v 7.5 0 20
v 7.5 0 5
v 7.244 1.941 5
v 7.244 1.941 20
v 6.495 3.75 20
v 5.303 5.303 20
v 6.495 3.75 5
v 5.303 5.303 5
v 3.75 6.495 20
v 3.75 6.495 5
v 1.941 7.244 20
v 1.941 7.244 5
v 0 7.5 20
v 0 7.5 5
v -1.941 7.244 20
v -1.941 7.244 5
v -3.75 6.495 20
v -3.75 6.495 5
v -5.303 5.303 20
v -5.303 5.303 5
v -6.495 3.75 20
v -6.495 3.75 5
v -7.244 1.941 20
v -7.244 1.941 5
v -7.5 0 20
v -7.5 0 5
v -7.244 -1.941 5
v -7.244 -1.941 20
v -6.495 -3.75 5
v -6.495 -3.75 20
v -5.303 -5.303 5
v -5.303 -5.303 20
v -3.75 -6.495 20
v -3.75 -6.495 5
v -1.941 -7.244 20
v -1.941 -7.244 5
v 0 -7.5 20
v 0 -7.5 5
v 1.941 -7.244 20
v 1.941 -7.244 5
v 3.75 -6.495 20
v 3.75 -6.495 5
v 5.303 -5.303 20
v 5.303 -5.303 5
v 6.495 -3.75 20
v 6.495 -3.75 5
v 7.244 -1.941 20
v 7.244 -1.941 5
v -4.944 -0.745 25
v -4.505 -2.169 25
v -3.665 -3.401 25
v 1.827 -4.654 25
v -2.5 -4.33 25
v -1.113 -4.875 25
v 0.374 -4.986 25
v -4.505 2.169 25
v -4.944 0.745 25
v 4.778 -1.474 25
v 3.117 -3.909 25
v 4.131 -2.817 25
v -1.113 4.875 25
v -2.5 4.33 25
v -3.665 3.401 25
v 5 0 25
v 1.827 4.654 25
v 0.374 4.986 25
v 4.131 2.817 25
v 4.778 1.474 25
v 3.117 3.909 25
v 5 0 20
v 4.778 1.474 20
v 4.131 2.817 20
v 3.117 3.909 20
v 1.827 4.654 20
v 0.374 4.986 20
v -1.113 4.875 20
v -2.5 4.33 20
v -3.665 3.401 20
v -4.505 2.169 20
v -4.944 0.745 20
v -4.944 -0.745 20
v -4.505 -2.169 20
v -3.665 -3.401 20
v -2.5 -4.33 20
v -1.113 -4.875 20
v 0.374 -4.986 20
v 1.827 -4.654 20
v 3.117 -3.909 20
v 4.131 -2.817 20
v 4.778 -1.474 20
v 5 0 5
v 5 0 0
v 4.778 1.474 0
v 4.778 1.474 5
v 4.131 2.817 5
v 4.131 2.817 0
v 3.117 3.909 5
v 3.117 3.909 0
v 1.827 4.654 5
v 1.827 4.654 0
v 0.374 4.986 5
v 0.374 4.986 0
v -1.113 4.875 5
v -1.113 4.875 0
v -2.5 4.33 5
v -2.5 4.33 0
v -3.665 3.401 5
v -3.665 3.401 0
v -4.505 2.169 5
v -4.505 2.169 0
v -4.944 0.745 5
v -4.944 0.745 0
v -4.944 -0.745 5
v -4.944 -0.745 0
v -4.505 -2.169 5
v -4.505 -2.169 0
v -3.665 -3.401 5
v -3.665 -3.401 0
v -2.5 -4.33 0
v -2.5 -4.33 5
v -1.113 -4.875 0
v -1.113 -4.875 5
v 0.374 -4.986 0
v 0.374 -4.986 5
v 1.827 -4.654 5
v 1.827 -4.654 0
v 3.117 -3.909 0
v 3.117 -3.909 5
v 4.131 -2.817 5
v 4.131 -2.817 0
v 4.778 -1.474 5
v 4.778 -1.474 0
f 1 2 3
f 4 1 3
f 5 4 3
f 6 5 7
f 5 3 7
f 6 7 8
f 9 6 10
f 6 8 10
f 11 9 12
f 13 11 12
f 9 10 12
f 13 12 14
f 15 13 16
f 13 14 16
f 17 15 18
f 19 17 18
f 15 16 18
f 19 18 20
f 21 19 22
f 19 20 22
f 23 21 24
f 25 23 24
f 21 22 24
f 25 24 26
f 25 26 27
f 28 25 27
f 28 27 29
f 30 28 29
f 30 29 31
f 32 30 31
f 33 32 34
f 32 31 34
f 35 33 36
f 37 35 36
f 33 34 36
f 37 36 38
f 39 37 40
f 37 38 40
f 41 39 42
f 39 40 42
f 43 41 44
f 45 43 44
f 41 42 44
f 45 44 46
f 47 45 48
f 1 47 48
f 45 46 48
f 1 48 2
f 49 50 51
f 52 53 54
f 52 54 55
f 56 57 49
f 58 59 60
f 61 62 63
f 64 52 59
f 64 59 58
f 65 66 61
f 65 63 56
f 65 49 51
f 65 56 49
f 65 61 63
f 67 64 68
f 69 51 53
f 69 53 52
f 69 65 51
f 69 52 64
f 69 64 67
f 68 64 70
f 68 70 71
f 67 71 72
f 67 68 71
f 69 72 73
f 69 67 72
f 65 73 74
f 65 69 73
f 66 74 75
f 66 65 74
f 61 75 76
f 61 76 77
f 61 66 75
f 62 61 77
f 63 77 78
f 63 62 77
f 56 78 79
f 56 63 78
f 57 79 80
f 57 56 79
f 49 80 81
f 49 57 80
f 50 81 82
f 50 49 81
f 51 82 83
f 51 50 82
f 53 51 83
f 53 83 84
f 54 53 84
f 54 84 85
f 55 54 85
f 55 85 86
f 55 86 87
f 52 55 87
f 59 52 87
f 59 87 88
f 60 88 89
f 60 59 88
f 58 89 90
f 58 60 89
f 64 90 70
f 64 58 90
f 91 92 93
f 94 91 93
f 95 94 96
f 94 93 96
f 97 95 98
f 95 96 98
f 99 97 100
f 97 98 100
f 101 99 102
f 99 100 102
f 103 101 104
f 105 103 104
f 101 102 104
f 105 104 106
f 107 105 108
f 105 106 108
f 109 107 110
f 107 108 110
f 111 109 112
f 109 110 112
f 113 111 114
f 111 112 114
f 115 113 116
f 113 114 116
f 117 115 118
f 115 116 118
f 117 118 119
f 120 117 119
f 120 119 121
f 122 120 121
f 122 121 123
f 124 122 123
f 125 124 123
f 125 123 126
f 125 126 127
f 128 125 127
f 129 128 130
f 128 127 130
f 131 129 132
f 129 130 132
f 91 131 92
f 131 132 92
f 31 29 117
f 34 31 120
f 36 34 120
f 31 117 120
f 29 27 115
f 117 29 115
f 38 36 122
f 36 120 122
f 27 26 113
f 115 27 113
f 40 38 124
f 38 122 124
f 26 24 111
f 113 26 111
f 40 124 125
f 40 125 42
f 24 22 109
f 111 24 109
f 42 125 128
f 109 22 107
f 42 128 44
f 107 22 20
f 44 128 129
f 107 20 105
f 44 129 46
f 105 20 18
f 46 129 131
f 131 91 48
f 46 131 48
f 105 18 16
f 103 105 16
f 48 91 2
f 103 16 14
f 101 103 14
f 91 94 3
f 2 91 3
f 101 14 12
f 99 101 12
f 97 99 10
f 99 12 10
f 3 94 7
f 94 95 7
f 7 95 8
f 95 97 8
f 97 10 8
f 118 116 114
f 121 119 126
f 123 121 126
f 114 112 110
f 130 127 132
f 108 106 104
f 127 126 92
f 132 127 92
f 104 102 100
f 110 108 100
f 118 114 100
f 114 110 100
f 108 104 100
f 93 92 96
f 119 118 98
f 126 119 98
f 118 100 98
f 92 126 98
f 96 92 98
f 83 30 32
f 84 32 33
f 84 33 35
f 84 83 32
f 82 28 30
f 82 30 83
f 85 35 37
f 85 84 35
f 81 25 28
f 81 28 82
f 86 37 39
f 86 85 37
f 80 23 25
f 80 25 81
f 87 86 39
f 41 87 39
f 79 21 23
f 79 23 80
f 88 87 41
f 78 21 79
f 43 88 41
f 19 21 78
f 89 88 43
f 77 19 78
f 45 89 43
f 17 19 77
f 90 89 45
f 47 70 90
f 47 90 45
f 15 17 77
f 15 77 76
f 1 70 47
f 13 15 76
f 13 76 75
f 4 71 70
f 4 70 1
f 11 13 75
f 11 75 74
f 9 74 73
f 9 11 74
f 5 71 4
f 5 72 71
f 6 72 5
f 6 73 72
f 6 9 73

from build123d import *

# Parameters (mm, degrees)
SKETCH_1_R      = 5
EXTRUDE_1_DEPTH = 5
SKETCH_2_R      = 7.5
EXTRUDE_2_DEPTH = 15


with BuildPart() as part:
    # 스케치1 → 보스-돌출1 (new body)
    with BuildSketch(Plane.XY):
        Circle(SKETCH_1_R)
    extrude_1 = extrude(amount=EXTRUDE_1_DEPTH)

    # 스케치2 → 보스-돌출2 (add)
    with BuildSketch(Plane.XY.offset(5)):
        Circle(SKETCH_2_R)
    extrude(amount=EXTRUDE_2_DEPTH)

    # 대칭 복사1: 보스-돌출1 across plane
    add(extrude_1.mirror(Plane(origin=(0, 0, 12.5), x_dir=(1, 0, 0), z_dir=(0, 0, -1))))


solid = part.part
